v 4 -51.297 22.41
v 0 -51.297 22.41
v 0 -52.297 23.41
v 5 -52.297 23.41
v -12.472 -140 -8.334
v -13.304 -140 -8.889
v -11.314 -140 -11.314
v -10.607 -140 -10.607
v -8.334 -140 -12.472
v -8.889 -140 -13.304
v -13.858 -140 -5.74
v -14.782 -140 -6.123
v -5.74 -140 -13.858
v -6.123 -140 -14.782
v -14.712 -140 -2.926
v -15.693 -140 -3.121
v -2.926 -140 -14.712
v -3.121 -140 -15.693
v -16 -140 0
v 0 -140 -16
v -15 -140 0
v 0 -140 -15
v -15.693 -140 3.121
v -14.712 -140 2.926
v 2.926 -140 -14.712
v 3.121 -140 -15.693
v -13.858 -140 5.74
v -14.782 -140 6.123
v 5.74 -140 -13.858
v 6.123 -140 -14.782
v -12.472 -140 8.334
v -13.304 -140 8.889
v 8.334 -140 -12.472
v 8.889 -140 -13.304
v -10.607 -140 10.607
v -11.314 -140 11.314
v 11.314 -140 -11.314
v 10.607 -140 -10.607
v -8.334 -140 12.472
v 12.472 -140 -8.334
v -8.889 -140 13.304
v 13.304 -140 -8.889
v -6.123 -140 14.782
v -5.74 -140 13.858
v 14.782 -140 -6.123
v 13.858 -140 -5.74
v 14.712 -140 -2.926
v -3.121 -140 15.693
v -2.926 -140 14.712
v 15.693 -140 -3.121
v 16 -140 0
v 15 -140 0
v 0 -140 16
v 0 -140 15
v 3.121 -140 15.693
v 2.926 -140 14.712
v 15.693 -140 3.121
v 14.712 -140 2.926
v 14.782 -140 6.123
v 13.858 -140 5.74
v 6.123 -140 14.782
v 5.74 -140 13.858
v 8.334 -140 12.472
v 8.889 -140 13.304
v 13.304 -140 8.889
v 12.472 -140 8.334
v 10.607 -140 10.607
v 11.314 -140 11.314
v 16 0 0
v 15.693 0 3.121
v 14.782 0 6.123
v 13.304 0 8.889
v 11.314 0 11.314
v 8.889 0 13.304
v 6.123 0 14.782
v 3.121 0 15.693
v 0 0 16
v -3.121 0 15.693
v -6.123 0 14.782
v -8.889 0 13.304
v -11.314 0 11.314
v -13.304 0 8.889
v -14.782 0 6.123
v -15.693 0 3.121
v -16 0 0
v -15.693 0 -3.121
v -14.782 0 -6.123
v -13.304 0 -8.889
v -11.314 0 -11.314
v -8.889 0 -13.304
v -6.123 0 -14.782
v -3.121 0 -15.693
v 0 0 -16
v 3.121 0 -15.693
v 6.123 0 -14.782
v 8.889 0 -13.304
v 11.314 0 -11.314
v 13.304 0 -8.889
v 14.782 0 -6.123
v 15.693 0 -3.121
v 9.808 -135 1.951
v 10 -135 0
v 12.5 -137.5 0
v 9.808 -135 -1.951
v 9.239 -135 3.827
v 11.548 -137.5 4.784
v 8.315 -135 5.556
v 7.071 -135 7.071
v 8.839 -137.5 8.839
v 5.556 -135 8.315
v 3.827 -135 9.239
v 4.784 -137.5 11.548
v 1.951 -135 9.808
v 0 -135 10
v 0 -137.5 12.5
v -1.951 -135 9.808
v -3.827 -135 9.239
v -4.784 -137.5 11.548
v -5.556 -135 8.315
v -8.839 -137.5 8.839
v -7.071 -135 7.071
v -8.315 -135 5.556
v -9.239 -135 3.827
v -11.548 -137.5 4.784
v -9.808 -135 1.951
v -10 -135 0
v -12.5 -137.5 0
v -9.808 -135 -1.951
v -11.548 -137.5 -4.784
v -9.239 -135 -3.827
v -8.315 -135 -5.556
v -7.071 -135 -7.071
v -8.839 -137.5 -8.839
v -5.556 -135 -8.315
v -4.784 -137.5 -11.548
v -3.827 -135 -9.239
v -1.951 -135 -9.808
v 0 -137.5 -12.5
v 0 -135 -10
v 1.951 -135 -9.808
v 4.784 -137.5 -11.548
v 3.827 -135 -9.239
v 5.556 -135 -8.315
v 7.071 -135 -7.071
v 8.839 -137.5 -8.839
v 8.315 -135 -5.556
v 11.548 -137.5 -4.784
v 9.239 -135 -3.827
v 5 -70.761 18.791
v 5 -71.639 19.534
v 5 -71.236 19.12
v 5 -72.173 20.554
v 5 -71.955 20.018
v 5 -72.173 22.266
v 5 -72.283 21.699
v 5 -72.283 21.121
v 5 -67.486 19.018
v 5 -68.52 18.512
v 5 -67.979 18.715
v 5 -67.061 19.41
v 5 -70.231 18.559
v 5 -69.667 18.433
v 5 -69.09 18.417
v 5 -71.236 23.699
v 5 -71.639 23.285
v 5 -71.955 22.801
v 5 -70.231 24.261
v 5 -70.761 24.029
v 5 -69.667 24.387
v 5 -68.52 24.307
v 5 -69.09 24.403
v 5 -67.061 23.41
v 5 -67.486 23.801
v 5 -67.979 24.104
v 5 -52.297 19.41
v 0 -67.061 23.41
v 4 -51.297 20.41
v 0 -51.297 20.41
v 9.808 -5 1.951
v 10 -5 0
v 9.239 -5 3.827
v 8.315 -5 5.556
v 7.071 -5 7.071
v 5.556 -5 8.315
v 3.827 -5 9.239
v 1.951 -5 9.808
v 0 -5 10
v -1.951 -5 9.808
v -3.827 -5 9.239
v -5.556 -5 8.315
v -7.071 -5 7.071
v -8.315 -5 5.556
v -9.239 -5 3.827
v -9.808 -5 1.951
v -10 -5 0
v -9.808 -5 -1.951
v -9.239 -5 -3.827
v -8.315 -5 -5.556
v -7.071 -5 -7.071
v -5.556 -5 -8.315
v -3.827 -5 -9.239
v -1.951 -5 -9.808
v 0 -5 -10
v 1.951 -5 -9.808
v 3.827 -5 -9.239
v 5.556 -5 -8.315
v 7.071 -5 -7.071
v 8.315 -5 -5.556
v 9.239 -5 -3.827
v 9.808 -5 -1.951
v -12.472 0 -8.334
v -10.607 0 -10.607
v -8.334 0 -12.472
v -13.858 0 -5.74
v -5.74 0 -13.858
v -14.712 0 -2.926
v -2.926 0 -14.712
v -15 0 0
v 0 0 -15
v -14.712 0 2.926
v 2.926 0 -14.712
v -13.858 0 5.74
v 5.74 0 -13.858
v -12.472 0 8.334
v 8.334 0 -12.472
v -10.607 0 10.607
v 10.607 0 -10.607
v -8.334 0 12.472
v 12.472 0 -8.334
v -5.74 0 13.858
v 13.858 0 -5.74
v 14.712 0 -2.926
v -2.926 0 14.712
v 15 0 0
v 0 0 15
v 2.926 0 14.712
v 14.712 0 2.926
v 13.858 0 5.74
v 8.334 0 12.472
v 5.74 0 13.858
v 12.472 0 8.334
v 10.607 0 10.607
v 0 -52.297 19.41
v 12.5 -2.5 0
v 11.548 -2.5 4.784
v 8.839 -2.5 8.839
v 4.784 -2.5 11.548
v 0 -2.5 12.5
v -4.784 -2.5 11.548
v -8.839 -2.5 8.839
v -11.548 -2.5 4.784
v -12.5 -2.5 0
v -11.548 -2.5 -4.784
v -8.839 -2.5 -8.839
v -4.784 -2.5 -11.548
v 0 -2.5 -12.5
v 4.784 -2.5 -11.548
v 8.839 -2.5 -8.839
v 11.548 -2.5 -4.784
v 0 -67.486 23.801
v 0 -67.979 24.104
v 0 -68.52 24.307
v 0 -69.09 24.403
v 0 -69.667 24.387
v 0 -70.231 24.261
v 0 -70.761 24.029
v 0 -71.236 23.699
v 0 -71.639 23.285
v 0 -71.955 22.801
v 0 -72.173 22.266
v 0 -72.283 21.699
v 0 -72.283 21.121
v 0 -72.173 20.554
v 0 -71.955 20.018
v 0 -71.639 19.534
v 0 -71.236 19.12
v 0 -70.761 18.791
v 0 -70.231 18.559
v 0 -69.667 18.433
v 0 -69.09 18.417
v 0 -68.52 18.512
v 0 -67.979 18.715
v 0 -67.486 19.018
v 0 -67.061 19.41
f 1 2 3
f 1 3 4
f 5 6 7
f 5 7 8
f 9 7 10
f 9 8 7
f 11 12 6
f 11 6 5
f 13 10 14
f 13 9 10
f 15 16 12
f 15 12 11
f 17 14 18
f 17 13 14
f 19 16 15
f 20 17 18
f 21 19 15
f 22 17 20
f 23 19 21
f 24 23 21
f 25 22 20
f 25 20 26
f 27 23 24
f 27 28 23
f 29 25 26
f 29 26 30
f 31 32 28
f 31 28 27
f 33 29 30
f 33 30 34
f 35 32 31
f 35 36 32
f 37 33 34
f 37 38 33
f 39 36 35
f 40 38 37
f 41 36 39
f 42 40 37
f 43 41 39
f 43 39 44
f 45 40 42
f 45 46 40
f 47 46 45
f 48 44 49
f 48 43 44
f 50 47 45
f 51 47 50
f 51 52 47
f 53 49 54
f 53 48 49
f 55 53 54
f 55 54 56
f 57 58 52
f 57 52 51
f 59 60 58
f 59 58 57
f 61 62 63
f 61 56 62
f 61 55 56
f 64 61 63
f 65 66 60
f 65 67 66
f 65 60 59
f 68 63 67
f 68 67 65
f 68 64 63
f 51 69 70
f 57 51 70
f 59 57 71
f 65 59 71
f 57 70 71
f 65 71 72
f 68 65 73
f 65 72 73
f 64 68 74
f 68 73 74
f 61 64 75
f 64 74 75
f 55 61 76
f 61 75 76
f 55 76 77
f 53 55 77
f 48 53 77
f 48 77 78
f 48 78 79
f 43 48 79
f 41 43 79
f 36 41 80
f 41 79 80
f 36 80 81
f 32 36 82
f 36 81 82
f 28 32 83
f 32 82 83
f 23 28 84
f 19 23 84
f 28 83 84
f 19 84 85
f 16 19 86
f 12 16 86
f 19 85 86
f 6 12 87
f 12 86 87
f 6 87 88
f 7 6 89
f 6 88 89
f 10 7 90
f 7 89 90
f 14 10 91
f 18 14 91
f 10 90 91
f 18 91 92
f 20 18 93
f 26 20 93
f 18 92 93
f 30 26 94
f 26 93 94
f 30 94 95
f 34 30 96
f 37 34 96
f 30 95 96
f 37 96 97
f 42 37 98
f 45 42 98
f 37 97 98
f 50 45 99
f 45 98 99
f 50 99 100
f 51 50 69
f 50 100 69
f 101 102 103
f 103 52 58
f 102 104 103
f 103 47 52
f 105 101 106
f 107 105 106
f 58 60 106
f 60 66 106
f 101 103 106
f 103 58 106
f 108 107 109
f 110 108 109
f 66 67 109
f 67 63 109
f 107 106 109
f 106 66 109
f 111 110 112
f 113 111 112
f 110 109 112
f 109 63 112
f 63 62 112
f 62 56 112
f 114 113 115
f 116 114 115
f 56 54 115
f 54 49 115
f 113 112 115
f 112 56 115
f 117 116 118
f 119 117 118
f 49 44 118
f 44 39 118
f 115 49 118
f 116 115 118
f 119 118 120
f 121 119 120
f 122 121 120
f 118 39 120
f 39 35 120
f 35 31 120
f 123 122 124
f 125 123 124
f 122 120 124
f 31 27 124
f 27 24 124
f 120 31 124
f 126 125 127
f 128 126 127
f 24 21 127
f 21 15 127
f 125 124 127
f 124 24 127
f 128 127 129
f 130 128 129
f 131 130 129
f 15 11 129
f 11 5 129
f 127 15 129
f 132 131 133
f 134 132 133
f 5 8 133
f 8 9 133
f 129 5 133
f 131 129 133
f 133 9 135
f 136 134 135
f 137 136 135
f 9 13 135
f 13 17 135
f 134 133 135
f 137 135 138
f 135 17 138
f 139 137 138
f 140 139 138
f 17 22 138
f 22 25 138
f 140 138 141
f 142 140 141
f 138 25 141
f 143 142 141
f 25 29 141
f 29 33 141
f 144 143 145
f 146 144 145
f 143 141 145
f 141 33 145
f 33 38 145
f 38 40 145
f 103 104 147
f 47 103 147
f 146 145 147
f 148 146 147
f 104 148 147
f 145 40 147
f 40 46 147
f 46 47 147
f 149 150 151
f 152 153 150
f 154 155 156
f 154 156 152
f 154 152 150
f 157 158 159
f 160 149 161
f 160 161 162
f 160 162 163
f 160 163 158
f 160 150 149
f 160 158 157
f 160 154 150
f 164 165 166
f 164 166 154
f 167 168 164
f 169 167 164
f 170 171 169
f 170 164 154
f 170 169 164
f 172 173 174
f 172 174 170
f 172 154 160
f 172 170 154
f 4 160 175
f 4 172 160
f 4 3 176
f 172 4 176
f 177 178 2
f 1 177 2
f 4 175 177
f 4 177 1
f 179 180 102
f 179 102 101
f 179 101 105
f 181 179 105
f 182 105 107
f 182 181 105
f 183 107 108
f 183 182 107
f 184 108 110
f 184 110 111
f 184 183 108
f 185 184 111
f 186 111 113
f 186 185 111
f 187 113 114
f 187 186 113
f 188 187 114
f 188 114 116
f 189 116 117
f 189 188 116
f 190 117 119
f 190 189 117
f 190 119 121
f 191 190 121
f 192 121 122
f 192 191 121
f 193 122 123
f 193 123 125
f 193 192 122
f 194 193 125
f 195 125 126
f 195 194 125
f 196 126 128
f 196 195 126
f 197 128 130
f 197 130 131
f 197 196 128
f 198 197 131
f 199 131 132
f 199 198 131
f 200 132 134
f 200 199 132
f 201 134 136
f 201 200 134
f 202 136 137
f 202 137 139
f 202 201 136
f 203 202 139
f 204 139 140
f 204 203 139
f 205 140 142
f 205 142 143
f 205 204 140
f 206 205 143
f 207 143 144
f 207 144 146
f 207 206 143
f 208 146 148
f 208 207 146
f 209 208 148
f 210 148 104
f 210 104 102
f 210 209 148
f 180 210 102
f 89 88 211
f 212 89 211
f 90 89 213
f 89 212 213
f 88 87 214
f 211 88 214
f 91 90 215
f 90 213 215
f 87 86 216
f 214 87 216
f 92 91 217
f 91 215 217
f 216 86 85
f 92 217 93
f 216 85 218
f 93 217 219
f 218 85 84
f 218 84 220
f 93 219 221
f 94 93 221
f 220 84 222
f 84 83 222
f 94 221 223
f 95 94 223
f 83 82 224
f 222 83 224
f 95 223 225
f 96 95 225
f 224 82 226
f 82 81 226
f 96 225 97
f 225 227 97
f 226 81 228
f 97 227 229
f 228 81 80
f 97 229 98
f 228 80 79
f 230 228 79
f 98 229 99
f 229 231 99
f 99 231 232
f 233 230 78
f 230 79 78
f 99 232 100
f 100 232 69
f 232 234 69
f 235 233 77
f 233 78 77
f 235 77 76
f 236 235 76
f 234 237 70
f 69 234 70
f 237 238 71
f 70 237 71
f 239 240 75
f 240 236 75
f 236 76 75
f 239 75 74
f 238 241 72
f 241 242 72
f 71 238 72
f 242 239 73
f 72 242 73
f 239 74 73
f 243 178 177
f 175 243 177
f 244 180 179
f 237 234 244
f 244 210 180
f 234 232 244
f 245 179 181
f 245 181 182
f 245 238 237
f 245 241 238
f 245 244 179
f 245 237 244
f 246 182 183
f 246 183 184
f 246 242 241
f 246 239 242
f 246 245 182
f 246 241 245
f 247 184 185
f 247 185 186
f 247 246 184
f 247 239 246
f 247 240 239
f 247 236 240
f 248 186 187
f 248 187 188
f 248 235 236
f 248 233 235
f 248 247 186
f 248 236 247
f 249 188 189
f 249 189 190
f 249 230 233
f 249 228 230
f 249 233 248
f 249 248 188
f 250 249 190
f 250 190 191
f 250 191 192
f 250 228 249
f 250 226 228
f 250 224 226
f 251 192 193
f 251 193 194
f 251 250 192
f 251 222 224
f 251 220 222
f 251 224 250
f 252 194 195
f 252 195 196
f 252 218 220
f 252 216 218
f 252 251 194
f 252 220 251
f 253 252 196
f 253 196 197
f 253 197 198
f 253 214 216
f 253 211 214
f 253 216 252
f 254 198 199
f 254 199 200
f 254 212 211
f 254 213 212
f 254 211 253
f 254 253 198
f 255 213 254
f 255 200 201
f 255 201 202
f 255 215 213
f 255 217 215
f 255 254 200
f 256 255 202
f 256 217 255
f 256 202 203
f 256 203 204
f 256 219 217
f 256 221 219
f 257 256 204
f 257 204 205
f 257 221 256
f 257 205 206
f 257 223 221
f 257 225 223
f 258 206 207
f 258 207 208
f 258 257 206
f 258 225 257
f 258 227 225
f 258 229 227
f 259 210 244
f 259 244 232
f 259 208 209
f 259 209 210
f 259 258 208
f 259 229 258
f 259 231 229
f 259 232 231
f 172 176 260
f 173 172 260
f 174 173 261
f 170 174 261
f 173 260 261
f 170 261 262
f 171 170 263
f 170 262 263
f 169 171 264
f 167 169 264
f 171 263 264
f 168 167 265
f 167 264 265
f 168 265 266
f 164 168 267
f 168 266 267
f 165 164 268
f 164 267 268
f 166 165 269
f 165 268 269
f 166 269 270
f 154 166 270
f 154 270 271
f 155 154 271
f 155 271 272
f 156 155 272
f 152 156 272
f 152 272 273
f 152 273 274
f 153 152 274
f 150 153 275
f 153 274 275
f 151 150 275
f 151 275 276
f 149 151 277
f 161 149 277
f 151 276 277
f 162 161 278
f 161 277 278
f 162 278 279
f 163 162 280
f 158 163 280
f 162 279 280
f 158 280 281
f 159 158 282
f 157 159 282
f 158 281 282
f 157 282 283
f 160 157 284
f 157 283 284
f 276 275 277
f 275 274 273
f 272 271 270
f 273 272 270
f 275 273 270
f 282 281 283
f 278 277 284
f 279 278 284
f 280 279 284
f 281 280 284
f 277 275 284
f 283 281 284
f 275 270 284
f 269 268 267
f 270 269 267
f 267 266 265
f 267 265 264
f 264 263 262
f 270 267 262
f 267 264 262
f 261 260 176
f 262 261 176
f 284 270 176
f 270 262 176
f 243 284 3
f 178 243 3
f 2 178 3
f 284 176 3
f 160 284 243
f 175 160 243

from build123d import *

# Parameters (mm, degrees)
F0_R     = 16
F0_R_2   = 10
F1_DEPTH = 140
F2_SIZE  = 5
F4_DEPTH = 5
F5_SIZE  = 1


with BuildPart() as f1:
    # F0 (on Front) → F1 (new body)
    with BuildSketch(Plane.XZ):
        Circle(F0_R)
        Circle(F0_R_2, mode=Mode.SUBTRACT)
    extrude(amount=F1_DEPTH)

    # F2
    f2_edges = [f1.edges().sort_by_distance(p)[0] for p in [
        (-10, -140, 0),
        (-10, 0, 0),
    ]]
    chamfer(f2_edges, length=F2_SIZE)


with BuildPart() as f4:
    # F3 (on Right) → F4 (new body)
    with BuildSketch(Plane.YZ):
        with BuildLine():
            Line((-51.297374, 23.409808), (-67.061306, 23.409808))
            ThreePointArc((-67.061306, 23.409808), (-66.494857, 22.480274), (-66.297374, 21.409808))
            ThreePointArc((-66.297374, 21.409808), (-66.494857, 20.339342), (-67.061306, 19.409808))
            Line((-67.061306, 19.409808), (-51.297374, 19.409808))
            Line((-51.297374, 19.409808), (-51.297374, 23.409808))
        make_face()
        with BuildLine():
            Line((-67.061306, 23.409808), (-69.297374, 23.409808))
            Line((-69.297374, 23.409808), (-69.297374, 19.409808))
            Line((-69.297374, 19.409808), (-67.061306, 19.409808))
            ThreePointArc((-67.061306, 19.409808), (-66.494857, 20.339342), (-66.297374, 21.409808))
            ThreePointArc((-66.297374, 21.409808), (-66.494857, 22.480274), (-67.061306, 23.409808))
        make_face()
        with BuildLine():
            Line((-69.297374, 19.409808), (-69.297374, 23.409808))
            Line((-69.297374, 23.409808), (-67.061306, 23.409808))
            ThreePointArc((-67.061306, 23.409808), (-72.297374, 21.409808), (-67.061306, 19.409808))
            Line((-67.061306, 19.409808), (-69.297374, 19.409808))
        make_face()
    extrude(amount=F4_DEPTH)

    # F5
    f5_edges = [f4.edges().sort_by_distance(p)[0] for p in [
        (2.5, -51.297374, 23.409808),
        (2.5, -51.297374, 19.409808),
        (5, -51.297374, 21.409808),
    ]]
    chamfer(f5_edges, length=F5_SIZE)


solid = Compound([f1.part, f4.part])
